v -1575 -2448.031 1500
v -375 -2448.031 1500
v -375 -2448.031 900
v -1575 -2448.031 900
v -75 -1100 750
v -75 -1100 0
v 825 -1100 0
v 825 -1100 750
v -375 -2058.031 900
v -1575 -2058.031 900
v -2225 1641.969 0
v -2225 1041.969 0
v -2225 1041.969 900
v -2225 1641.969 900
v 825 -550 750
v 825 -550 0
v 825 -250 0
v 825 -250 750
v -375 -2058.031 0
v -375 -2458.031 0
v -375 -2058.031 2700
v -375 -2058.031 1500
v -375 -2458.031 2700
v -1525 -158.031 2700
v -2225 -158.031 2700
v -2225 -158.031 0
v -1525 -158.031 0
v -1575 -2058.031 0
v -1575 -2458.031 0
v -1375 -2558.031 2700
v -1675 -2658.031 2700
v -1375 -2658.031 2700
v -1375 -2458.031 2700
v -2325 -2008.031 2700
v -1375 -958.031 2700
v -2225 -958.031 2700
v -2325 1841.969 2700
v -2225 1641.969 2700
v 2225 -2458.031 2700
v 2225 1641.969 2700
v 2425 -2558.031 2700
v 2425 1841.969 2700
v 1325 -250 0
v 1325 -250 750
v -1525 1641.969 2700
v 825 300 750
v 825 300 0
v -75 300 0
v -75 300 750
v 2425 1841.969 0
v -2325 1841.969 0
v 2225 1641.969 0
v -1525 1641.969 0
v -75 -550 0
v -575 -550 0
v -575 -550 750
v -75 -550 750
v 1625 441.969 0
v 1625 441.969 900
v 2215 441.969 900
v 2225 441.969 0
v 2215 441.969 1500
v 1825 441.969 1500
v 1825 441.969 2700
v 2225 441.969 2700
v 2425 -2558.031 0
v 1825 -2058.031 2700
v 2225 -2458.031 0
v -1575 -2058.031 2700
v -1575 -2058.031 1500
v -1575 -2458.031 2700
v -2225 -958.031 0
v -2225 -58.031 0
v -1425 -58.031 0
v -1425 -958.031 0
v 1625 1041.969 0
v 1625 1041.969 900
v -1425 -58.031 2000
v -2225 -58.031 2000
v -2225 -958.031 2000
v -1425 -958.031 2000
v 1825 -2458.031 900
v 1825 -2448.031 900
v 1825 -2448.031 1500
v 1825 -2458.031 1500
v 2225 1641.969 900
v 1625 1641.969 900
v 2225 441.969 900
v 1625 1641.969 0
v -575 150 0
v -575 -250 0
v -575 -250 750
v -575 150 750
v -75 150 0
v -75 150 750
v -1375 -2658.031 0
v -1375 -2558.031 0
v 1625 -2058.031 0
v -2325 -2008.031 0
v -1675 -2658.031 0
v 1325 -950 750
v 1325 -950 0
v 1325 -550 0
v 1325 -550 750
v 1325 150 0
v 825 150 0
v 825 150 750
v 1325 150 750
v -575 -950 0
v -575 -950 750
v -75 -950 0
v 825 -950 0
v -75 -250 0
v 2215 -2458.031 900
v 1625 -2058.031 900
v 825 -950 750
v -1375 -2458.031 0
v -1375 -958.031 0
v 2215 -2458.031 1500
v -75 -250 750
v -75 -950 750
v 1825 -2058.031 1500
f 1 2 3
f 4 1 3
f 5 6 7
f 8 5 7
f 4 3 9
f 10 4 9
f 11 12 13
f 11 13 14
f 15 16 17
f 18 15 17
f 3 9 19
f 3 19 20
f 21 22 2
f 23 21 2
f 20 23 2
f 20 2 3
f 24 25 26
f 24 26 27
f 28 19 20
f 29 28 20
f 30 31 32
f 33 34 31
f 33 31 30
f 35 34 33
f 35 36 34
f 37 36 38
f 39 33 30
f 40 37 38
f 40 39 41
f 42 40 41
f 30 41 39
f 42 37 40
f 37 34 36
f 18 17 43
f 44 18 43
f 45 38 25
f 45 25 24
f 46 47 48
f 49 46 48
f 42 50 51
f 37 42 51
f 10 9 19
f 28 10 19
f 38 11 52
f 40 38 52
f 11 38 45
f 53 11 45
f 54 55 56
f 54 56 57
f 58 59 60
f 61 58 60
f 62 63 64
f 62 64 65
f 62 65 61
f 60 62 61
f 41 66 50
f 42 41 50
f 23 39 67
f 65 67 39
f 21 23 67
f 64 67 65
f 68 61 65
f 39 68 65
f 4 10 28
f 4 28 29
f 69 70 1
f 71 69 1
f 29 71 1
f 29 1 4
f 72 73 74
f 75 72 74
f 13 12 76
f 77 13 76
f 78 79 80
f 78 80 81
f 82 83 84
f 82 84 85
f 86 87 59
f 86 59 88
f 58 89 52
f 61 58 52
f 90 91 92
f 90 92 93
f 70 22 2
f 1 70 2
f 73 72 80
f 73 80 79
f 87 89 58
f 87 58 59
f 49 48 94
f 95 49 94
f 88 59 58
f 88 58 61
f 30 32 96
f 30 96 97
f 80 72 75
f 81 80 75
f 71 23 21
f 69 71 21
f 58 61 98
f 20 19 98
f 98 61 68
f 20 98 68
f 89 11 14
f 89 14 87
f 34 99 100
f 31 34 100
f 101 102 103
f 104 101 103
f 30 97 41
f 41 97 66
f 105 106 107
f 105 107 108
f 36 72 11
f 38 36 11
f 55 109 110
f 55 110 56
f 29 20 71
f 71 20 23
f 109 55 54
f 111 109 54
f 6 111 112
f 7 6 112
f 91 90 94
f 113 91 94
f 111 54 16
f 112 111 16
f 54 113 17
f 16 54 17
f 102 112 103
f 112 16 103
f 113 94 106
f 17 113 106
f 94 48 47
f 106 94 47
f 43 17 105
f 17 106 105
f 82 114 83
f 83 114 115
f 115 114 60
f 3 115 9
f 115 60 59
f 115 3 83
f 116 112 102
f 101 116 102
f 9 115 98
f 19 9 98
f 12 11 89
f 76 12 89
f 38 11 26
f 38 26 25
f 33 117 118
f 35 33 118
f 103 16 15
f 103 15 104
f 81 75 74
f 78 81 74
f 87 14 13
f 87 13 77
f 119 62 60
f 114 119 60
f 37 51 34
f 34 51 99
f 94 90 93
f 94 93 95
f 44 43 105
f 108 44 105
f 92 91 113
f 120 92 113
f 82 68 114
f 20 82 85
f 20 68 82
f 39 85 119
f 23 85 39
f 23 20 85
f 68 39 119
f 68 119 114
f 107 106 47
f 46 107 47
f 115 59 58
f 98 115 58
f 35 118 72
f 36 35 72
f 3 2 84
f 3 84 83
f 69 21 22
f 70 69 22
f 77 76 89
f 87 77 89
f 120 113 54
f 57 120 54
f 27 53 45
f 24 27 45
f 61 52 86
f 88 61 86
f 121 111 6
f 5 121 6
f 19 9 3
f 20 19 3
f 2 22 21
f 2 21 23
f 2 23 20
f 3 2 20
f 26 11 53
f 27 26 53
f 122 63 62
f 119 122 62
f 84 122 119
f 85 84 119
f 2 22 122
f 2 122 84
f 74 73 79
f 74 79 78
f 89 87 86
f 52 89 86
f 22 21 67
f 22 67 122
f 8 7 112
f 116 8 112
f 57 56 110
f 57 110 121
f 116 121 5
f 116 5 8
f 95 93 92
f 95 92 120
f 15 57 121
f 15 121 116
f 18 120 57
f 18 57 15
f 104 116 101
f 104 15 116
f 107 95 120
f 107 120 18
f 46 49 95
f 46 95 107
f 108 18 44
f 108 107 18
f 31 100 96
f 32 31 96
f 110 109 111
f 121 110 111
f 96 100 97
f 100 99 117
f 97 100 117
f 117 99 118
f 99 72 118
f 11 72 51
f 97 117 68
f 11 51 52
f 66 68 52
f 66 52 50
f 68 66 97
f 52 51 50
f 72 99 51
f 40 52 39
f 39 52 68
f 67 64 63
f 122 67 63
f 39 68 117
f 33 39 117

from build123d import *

# Parameters (mm, degrees)
F1_DEPTH       = 2700
F2_W           = 700
F2_H           = 2700
F3_DEPTH       = 1800
F4_W           = 500
F4_H           = 400
F5_DEPTH       = 750
F6_W           = 600
F6_H           = 900
F7_DEPTH       = 1200
F9_DEPTH       = 2900
F11_DEPTH      = 2000
F11_DEPTH_BACK = 200
F13_DEPTH      = 1200
F14_W          = 3850
F14_H          = 600
F15_DEPTH      = 900
F14_W_2        = 800
F14_H_2        = 900
F16_DEPTH      = 2000


with BuildPart() as f1:
    # F0 (on Top) → F1 (new body)
    with BuildSketch(Plane.XY):
        Polygon((-1375, -2658.0309391022), (-1375, -2558.0309391022), (2425, -2558.0309391022), (2425, 1841.9690608978), (-2325, 1841.9690608978), (-2325, -2008.0309391022), (-1675, -2658.0309391022), align=None)
        Polygon((-2225, -958.0309391022), (-2225, 1641.9690608978), (2225, 1641.9690608978), (2225, -2458.0309391022), (-1375, -2458.0309391022), (-1375, -958.0309391022), align=None, mode=Mode.SUBTRACT)
    extrude(amount=F1_DEPTH)


with BuildPart() as f3:
    # F2 (on face) → F3 (new body)
    with BuildSketch(Plane.XZ.offset(-1641.9690608978)):
        with Locations((-1875, 1350)):
            Rectangle(F2_W, F2_H)
    extrude(amount=F3_DEPTH)


with BuildPart() as f5:
    # F4 (on Top) → F5 (new body)
    with BuildSketch(Plane.XY):
        with Locations((-325, -50)):
            Rectangle(F4_W, F4_H)
        Polygon((825, 300), (-75, 300), (-75, 150), (-75, -250), (-75, -400), (825, -400), (825, -250), (825, 150), align=None)
        with Locations((1075, -50)):
            Rectangle(F4_W, F4_H)
        Polygon((825, -400), (-75, -400), (-75, -550), (-75, -950), (-75, -1100), (825, -1100), (825, -950), (825, -550), align=None)
        with Locations((-325, -750)):
            Rectangle(F4_W, F4_H)
        with Locations((1075, -750)):
            Rectangle(F4_W, F4_H)
    extrude(amount=F5_DEPTH)


with BuildPart() as f7:
    # F6 (on face) → F7 (new body)
    with BuildSketch(Plane.XZ.offset(-1641.9690608978)):
        with Locations((1925, 450)):
            Rectangle(F6_W, F6_H)
    extrude(amount=F7_DEPTH)


with BuildPart() as f9:
    # F8 (on face) → F9 (new body, through all)
    with BuildSketch(Plane.XZ.offset(-441.9690608978)):
        Polygon((2215, 900), (2225, 900), (2225, 2700), (1825, 2700), (1825, 1500), (2215, 1500), align=None)
        Polygon((1625, 0), (2225, 0), (2225, 900), (2215, 900), (1625, 900), align=None)
    extrude(amount=F9_DEPTH)

    # F10 (on face) → F11 (join, two sides)
    with BuildSketch(Plane(origin=(1625, 0, 0), x_dir=(0, -1, 0), z_dir=(-1, 0, 0))) as f11_sk:
        Polygon((2448.0309391022, 900), (2458.0309391022, 900), (2458.0309391022, 2700), (2058.0309391022, 2700), (2058.0309391022, 1500), (2448.0309391022, 1500), align=None)
        Polygon((2058.0309391022, 0), (2458.0309391022, 0), (2458.0309391022, 900), (2448.0309391022, 900), (2058.0309391022, 900), align=None)
    extrude(amount=F11_DEPTH)
    extrude(f11_sk.sketch, amount=-F11_DEPTH_BACK)


with BuildPart() as f13:
    # F12 (on face) → F13 (new body)
    with BuildSketch(Plane(origin=(-375, 0, 0), x_dir=(0, -1, 0), z_dir=(-1, 0, 0))):
        Polygon((2458.0309391022, 0), (2458.0309391022, 2700), (2058.0309391022, 2700), (2058.0309391022, 1500), (2448.0309391022, 1500), (2448.0309391022, 900), (2058.0309391022, 900), (2058.0309391022, 0), align=None)
    extrude(amount=F13_DEPTH)


with BuildPart() as f15:
    # F14 (on Top) → F15 (new body)
    with BuildSketch(Plane.XY):
        with Locations((-300, 1341.9690608978)):
            Rectangle(F14_W, F14_H)
    extrude(amount=F15_DEPTH)


with BuildPart() as f16:
    # F14 (on Top) → F16 (new body)
    with BuildSketch(Plane.XY):
        with Locations((-1825, -508.0309391022)):
            Rectangle(F14_W_2, F14_H_2)
    extrude(amount=F16_DEPTH)


solid = Compound([f1.part, f3.part, f5.part, f7.part, f9.part, f13.part, f15.part, f16.part])
